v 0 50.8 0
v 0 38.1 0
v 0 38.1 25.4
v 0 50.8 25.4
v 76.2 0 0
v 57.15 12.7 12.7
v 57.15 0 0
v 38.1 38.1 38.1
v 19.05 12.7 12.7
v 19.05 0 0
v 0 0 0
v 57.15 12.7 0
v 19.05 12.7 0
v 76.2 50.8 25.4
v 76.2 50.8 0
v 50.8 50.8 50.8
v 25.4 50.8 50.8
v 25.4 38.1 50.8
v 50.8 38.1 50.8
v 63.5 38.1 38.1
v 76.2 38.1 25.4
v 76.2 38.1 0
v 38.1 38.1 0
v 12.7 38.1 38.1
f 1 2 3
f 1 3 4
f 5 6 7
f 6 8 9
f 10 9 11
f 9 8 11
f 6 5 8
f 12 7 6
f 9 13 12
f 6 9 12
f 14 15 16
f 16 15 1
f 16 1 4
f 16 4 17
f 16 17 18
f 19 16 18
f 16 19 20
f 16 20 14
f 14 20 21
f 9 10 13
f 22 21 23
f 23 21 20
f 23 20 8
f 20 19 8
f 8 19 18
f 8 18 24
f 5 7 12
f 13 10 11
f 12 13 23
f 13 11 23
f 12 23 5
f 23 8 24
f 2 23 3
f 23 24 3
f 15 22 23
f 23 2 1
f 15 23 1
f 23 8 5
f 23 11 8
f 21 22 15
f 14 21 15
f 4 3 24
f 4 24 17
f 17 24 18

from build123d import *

# Parameters (mm, degrees)
F1_DEPTH = 76.2
F3_DEPTH = 50.801
F5_DEPTH = 50.801
F6_W     = 38.1
F6_H     = 12.7
F7_DEPTH = 25.4


with BuildPart() as f1:
    # F0 (on Right) → F1 (new body)
    with BuildSketch(Plane.YZ):
        Polygon((38.1, 38.1), (0, 0), (38.1, 0), align=None)
        Polygon((38.1, 38.1), (38.1, 0), (50.8, 0), (50.8, 50.8), (38.1, 50.8), align=None)
    extrude(amount=F1_DEPTH)

    # F2 (on Front) → F3 (cut, through all)
    with BuildSketch(Plane.XZ):
        Polygon((0, 50.8), (0, 25.4), (25.4, 50.8), align=None)
        Polygon((50.8, 50.8), (76.2, 25.4), (76.2, 50.8), align=None)
    extrude(amount=-F3_DEPTH, mode=Mode.SUBTRACT)

    # F4 (on face) → F5 (cut, through all)
    with BuildSketch(Plane.XY.offset(50.8)):
        Polygon((50.8, 38.1), (38.1, 38.1), (76.2, 0), (76.2, 38.1), align=None)
        Polygon((0, 38.1), (0, 0), (38.1, 38.1), (25.4, 38.1), align=None)
    extrude(amount=-F5_DEPTH, mode=Mode.SUBTRACT)

    # F6 (on Top) → F7 (cut)
    with BuildSketch(Plane.XY):
        with Locations((38.1, 6.35)):
            Rectangle(F6_W, F6_H)
    extrude(amount=F7_DEPTH, mode=Mode.SUBTRACT)


solid = f1.part
